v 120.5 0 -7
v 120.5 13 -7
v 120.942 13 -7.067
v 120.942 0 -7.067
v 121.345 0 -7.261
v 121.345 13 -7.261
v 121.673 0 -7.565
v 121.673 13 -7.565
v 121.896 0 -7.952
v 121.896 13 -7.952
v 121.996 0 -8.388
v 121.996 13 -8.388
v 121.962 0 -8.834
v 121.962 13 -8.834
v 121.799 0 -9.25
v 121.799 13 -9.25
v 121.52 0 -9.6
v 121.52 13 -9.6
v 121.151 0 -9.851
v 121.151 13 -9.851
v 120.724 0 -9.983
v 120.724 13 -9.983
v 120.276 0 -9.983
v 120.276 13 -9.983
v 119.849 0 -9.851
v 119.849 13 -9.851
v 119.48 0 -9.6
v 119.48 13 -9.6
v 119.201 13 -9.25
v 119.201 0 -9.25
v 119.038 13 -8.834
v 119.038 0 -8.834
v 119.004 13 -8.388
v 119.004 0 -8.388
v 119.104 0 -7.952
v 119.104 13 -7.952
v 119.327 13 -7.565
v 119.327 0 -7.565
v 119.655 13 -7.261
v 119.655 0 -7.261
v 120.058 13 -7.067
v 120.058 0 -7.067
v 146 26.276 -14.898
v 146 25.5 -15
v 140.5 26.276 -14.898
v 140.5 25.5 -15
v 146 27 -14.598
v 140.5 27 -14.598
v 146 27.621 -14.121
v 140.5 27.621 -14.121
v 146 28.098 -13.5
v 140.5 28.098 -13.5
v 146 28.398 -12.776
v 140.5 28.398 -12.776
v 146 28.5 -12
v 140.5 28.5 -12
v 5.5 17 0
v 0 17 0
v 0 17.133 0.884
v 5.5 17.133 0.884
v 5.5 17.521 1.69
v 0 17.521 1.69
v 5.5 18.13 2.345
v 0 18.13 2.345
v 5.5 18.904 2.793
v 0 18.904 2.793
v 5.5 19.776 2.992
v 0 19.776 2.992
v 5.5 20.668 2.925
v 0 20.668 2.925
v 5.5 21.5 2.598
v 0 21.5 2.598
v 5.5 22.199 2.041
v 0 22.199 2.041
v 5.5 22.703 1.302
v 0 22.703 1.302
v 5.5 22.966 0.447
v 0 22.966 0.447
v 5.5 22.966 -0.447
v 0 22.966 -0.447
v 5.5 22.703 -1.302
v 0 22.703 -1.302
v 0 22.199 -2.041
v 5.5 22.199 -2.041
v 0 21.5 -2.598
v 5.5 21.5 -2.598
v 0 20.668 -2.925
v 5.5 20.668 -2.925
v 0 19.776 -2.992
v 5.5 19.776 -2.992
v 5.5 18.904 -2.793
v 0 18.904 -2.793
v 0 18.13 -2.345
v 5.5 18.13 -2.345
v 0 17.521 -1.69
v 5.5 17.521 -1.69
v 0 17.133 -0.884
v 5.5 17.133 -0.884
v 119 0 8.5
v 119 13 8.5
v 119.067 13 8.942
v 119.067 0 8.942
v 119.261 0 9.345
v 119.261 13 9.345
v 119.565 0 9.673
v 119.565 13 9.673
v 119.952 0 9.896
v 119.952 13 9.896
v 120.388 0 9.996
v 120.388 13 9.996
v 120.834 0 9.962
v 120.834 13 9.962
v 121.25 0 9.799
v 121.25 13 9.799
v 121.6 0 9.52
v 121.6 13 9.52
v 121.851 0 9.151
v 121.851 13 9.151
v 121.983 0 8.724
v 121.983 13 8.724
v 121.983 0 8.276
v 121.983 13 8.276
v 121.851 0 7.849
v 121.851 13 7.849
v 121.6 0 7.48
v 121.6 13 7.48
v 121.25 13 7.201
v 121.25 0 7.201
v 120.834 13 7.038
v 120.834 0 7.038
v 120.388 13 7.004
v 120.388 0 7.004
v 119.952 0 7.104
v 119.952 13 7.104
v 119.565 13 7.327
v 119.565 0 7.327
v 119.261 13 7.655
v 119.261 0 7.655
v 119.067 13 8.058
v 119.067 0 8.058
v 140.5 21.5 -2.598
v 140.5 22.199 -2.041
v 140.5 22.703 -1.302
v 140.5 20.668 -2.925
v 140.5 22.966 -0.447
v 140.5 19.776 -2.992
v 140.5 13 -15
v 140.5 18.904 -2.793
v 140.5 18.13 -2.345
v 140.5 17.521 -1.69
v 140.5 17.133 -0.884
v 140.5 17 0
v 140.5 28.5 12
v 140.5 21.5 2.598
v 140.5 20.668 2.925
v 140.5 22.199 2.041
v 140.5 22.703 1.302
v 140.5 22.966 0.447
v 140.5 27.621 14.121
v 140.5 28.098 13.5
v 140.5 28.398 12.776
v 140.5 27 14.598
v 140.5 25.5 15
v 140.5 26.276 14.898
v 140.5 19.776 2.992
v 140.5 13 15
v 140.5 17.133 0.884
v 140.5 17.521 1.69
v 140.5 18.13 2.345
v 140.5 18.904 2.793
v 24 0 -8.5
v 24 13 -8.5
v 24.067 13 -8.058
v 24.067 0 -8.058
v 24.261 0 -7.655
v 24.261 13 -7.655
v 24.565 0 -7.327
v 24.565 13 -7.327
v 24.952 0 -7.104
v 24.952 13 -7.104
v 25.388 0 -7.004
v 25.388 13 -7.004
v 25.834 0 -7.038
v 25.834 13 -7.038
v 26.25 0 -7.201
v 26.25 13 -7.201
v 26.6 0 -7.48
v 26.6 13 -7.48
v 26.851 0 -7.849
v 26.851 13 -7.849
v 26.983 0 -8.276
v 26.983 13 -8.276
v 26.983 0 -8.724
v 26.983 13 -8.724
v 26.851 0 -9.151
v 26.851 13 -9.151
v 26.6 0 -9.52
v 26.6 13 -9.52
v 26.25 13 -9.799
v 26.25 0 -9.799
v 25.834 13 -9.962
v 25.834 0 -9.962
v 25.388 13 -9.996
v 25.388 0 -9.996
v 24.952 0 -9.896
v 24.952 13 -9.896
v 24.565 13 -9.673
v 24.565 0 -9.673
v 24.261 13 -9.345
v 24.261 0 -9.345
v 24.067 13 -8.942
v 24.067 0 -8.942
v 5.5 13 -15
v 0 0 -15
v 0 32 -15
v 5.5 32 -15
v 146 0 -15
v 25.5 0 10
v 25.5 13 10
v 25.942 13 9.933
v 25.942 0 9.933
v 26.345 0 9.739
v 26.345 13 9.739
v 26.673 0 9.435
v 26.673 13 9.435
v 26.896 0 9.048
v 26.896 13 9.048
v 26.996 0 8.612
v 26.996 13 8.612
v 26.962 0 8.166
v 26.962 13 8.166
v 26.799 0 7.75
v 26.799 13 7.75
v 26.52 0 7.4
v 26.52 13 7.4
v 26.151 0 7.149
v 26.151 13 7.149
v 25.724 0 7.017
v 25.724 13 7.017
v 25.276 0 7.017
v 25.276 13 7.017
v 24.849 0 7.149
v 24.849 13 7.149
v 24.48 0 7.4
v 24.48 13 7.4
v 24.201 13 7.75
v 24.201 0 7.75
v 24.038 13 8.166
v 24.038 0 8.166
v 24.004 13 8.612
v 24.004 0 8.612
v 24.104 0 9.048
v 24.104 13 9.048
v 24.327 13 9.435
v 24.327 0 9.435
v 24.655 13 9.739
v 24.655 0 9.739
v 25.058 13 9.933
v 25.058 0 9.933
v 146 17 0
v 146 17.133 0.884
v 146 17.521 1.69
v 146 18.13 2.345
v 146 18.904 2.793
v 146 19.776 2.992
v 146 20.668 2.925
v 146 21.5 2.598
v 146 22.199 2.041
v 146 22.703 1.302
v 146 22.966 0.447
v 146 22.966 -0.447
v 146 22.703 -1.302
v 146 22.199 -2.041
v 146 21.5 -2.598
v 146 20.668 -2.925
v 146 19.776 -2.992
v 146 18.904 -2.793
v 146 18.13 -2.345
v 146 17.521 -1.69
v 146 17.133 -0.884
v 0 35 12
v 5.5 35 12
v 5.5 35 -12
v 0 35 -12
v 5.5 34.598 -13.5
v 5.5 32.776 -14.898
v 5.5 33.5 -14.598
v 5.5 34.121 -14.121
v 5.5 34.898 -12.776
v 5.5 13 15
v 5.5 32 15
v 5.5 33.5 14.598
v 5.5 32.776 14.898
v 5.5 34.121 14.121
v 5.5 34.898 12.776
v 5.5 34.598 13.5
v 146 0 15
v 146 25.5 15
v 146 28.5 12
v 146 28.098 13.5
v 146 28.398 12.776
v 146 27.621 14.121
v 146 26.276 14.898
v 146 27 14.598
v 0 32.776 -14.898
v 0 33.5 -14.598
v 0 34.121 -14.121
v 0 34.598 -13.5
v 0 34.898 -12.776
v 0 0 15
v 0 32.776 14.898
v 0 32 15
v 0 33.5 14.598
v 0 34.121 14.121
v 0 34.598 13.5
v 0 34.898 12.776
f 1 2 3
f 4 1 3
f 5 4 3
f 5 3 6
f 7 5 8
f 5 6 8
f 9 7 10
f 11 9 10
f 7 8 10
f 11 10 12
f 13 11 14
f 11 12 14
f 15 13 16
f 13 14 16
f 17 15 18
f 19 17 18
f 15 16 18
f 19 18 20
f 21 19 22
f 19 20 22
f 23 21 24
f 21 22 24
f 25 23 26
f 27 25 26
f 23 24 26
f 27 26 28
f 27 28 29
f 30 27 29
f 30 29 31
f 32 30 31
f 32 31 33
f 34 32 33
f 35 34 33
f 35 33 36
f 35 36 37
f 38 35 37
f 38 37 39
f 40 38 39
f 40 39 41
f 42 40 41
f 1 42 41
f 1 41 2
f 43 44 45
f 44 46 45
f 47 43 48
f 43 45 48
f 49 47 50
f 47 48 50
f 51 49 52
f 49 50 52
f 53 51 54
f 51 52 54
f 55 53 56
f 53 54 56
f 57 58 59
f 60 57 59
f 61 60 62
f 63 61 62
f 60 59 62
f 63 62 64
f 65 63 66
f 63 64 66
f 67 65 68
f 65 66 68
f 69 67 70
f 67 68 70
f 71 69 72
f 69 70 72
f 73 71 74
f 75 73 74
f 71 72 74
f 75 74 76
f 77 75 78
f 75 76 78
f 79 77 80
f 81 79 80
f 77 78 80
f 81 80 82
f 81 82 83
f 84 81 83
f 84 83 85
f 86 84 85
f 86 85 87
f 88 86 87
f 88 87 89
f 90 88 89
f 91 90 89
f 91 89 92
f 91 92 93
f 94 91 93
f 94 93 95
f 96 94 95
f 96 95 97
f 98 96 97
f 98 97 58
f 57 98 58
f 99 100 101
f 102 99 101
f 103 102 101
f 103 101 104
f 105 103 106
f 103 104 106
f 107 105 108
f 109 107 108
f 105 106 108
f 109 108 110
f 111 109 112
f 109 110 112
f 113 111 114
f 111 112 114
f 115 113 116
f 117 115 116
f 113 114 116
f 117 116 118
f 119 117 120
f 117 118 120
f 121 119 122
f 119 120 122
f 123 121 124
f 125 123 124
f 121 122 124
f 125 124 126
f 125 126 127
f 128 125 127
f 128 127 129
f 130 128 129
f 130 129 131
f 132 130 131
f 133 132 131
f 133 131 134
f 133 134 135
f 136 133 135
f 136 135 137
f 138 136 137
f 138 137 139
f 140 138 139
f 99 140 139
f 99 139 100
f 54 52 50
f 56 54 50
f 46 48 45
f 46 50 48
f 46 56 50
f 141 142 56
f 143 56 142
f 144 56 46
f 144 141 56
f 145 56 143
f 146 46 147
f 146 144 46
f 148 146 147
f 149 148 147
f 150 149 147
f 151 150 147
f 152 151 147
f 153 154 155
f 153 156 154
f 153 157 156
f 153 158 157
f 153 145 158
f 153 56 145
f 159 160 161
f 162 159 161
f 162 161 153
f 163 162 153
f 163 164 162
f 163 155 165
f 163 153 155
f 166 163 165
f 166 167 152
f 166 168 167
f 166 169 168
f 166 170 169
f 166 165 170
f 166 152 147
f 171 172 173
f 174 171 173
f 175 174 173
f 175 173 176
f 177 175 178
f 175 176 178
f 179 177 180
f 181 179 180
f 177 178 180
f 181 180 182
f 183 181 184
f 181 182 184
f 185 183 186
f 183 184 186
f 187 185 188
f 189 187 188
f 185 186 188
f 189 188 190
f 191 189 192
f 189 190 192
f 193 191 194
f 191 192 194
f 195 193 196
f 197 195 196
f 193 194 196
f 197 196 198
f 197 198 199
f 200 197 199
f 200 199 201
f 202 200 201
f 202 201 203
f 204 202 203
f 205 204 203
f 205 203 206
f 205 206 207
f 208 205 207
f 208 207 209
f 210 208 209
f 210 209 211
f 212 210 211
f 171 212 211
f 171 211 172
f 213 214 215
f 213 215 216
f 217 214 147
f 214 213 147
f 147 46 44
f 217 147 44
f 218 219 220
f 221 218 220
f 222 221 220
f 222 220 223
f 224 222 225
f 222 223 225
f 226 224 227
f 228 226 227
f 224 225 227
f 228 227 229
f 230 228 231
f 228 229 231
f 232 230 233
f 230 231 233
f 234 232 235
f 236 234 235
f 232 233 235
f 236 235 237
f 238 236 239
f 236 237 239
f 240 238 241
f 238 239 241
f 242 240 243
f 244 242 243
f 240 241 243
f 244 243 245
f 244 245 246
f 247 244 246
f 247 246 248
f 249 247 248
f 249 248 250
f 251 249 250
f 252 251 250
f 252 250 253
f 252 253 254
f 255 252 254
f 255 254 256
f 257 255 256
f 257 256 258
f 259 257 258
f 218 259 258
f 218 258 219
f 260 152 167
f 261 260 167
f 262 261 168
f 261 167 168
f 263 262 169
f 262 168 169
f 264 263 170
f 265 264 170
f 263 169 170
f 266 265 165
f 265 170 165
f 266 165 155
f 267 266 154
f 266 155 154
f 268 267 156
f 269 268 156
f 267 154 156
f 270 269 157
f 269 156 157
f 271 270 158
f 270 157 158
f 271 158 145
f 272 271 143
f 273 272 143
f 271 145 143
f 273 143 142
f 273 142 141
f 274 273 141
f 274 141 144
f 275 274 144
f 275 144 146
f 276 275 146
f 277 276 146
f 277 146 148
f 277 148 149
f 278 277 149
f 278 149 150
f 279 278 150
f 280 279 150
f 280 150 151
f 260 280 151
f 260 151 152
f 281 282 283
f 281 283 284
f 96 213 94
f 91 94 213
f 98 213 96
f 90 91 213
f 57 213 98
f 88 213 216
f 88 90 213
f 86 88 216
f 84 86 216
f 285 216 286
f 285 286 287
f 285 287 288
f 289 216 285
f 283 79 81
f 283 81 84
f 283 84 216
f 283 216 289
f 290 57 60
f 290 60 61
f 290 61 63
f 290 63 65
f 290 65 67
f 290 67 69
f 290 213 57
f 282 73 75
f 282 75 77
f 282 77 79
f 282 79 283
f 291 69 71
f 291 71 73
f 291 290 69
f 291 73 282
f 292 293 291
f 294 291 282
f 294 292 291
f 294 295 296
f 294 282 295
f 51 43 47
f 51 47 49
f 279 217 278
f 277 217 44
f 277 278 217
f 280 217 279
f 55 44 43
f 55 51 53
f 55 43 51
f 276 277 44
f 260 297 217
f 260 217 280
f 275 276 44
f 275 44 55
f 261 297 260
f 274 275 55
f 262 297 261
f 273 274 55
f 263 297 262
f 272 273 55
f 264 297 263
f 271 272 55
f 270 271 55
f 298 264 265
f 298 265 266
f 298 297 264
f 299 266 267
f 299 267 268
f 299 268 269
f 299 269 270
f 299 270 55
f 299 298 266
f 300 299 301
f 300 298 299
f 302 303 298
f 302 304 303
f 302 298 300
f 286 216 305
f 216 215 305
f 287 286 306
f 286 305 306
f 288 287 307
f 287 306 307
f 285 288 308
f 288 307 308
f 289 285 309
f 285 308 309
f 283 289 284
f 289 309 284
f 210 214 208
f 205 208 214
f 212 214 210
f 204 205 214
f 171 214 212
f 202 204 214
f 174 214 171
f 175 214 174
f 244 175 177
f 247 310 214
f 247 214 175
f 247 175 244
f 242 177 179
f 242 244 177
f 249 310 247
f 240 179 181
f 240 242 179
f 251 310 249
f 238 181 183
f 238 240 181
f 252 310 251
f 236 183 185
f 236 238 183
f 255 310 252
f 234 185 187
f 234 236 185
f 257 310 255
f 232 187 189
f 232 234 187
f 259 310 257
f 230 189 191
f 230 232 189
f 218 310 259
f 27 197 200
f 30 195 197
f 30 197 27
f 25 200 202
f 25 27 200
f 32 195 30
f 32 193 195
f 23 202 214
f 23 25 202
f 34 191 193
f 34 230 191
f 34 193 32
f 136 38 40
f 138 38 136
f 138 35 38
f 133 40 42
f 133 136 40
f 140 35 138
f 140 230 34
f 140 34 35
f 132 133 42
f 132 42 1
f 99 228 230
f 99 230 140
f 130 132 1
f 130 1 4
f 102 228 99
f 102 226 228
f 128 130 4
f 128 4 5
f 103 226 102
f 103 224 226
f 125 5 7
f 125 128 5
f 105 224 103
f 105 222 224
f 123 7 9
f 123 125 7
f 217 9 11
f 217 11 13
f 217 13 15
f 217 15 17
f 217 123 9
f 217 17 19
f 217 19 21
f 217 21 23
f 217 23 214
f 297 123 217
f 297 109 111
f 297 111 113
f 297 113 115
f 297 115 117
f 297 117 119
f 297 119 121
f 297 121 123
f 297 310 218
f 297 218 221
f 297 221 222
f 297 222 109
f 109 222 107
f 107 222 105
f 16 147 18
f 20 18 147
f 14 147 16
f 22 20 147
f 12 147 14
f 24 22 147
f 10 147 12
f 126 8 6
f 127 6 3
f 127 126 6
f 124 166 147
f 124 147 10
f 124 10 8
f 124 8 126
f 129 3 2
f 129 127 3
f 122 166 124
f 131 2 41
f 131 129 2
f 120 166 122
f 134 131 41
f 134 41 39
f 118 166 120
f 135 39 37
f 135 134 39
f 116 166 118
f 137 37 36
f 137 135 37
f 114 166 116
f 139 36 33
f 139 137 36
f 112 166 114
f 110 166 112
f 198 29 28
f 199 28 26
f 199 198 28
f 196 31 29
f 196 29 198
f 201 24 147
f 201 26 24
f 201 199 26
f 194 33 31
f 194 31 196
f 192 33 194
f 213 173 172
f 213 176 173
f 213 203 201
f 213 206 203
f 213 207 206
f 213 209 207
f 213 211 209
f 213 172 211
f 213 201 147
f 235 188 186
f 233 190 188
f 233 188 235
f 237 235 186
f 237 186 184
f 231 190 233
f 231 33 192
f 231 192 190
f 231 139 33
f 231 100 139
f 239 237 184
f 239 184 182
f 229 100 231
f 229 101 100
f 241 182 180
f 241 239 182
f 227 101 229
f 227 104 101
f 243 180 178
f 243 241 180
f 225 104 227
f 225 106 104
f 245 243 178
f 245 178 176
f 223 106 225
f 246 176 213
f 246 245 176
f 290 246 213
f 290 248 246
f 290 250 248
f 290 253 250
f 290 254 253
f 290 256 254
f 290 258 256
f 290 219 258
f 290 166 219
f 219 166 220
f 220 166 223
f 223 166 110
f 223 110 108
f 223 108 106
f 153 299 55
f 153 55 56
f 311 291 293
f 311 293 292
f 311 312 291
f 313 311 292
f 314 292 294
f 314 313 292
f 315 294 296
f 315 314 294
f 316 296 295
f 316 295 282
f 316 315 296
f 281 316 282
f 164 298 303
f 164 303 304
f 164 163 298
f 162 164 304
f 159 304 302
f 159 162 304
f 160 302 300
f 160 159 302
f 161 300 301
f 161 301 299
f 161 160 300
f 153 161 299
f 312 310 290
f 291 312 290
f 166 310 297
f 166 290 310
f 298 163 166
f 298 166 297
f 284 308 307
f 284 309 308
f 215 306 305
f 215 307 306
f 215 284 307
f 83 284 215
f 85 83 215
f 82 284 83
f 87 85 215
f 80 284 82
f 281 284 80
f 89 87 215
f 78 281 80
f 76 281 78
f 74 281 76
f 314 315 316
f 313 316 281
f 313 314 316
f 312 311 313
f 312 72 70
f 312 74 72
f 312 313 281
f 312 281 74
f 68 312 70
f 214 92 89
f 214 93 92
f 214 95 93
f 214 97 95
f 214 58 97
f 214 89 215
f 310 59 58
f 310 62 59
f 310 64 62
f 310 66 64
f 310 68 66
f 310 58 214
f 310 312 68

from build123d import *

# Parameters (mm, degrees)
EXTRUDE_1_DEPTH     = 15
CUT_EXTRUDE_1_REACH = 150.408
SKETCH_2_R          = 1.5
FILLET_2_R          = 3
SKETCH_3_R          = 3
CUT_EXTRUDE_2_DEPTH = 151.884061451


with BuildPart() as part:
    # 草图1 → 凸台-拉伸1 (new, symmetric)
    with BuildSketch(Plane.XY):
        Polygon((0, 0), (146, 0), (146, 28.5), (140.5, 28.5), (140.5, 13), (5.5, 13), (5.5, 35), (0, 35), align=None)
    extrude(amount=EXTRUDE_1_DEPTH, both=True)

    # 草图2 → 切除-拉伸1 (cut, up to next)
    with BuildSketch(Plane(origin=(0, 13, 0), x_dir=(1, 0, 0), z_dir=(0, 1, 0)), mode=Mode.PRIVATE) as cut_extrude_1_sk1:
        with Locations(Location((25.5, 8.5, 0), (0, 0, 180))):
            Circle(SKETCH_2_R)
    cut_extrude_1_tool1 = extrude(cut_extrude_1_sk1.sketch, amount=-CUT_EXTRUDE_1_REACH, mode=Mode.PRIVATE) & part.part
    # 草图2 → 切除-拉伸1 (cut, up to next)
    with BuildSketch(Plane(origin=(0, 13, 0), x_dir=(1, 0, 0), z_dir=(0, 1, 0)), mode=Mode.PRIVATE) as cut_extrude_1_sk2:
        with Locations(Location((120.5, 8.5, 0), (0, 0, 270))):
            Circle(SKETCH_2_R)
    cut_extrude_1_tool2 = extrude(cut_extrude_1_sk2.sketch, amount=-CUT_EXTRUDE_1_REACH, mode=Mode.PRIVATE) & part.part
    # 草图2 → 切除-拉伸1 (cut, up to next)
    with BuildSketch(Plane(origin=(0, 13, 0), x_dir=(1, 0, 0), z_dir=(0, 1, 0)), mode=Mode.PRIVATE) as cut_extrude_1_sk3:
        with Locations(Location((25.5, -8.5, 0), (0, 0, 270))):
            Circle(SKETCH_2_R)
    cut_extrude_1_tool3 = extrude(cut_extrude_1_sk3.sketch, amount=-CUT_EXTRUDE_1_REACH, mode=Mode.PRIVATE) & part.part
    # 草图2 → 切除-拉伸1 (cut, up to next)
    with BuildSketch(Plane(origin=(0, 13, 0), x_dir=(1, 0, 0), z_dir=(0, 1, 0)), mode=Mode.PRIVATE) as cut_extrude_1_sk4:
        with Locations(Location((120.5, -8.5, 0), (0, 0, 180))):
            Circle(SKETCH_2_R)
    cut_extrude_1_tool4 = extrude(cut_extrude_1_sk4.sketch, amount=-CUT_EXTRUDE_1_REACH, mode=Mode.PRIVATE) & part.part
    add(cut_extrude_1_tool1.solids().sort_by_distance((25.5, 13, -8.5))[0], mode=Mode.SUBTRACT)
    add(cut_extrude_1_tool2.solids().sort_by_distance((120.5, 13, -8.5))[0], mode=Mode.SUBTRACT)
    add(cut_extrude_1_tool3.solids().sort_by_distance((25.5, 13, 8.5))[0], mode=Mode.SUBTRACT)
    add(cut_extrude_1_tool4.solids().sort_by_distance((120.5, 13, 8.5))[0], mode=Mode.SUBTRACT)

    # 圆角2
    fillet_2_edges = [part.edges().sort_by_distance(p)[0] for p in [
        (143.25, 28.5, -15),
        (143.25, 28.5, 15),
        (2.75, 35, 15),
        (2.75, 35, -15),
    ]]
    fillet(fillet_2_edges, radius=FILLET_2_R)

    # 草图3 → 切除-拉伸2 (cut, through all)
    with BuildSketch(Plane.ZY):
        with Locations(Location((0, 20, 0), (0, 0, 270))):
            Circle(SKETCH_3_R)
    extrude(amount=-CUT_EXTRUDE_2_DEPTH, mode=Mode.SUBTRACT)


solid = part.part
